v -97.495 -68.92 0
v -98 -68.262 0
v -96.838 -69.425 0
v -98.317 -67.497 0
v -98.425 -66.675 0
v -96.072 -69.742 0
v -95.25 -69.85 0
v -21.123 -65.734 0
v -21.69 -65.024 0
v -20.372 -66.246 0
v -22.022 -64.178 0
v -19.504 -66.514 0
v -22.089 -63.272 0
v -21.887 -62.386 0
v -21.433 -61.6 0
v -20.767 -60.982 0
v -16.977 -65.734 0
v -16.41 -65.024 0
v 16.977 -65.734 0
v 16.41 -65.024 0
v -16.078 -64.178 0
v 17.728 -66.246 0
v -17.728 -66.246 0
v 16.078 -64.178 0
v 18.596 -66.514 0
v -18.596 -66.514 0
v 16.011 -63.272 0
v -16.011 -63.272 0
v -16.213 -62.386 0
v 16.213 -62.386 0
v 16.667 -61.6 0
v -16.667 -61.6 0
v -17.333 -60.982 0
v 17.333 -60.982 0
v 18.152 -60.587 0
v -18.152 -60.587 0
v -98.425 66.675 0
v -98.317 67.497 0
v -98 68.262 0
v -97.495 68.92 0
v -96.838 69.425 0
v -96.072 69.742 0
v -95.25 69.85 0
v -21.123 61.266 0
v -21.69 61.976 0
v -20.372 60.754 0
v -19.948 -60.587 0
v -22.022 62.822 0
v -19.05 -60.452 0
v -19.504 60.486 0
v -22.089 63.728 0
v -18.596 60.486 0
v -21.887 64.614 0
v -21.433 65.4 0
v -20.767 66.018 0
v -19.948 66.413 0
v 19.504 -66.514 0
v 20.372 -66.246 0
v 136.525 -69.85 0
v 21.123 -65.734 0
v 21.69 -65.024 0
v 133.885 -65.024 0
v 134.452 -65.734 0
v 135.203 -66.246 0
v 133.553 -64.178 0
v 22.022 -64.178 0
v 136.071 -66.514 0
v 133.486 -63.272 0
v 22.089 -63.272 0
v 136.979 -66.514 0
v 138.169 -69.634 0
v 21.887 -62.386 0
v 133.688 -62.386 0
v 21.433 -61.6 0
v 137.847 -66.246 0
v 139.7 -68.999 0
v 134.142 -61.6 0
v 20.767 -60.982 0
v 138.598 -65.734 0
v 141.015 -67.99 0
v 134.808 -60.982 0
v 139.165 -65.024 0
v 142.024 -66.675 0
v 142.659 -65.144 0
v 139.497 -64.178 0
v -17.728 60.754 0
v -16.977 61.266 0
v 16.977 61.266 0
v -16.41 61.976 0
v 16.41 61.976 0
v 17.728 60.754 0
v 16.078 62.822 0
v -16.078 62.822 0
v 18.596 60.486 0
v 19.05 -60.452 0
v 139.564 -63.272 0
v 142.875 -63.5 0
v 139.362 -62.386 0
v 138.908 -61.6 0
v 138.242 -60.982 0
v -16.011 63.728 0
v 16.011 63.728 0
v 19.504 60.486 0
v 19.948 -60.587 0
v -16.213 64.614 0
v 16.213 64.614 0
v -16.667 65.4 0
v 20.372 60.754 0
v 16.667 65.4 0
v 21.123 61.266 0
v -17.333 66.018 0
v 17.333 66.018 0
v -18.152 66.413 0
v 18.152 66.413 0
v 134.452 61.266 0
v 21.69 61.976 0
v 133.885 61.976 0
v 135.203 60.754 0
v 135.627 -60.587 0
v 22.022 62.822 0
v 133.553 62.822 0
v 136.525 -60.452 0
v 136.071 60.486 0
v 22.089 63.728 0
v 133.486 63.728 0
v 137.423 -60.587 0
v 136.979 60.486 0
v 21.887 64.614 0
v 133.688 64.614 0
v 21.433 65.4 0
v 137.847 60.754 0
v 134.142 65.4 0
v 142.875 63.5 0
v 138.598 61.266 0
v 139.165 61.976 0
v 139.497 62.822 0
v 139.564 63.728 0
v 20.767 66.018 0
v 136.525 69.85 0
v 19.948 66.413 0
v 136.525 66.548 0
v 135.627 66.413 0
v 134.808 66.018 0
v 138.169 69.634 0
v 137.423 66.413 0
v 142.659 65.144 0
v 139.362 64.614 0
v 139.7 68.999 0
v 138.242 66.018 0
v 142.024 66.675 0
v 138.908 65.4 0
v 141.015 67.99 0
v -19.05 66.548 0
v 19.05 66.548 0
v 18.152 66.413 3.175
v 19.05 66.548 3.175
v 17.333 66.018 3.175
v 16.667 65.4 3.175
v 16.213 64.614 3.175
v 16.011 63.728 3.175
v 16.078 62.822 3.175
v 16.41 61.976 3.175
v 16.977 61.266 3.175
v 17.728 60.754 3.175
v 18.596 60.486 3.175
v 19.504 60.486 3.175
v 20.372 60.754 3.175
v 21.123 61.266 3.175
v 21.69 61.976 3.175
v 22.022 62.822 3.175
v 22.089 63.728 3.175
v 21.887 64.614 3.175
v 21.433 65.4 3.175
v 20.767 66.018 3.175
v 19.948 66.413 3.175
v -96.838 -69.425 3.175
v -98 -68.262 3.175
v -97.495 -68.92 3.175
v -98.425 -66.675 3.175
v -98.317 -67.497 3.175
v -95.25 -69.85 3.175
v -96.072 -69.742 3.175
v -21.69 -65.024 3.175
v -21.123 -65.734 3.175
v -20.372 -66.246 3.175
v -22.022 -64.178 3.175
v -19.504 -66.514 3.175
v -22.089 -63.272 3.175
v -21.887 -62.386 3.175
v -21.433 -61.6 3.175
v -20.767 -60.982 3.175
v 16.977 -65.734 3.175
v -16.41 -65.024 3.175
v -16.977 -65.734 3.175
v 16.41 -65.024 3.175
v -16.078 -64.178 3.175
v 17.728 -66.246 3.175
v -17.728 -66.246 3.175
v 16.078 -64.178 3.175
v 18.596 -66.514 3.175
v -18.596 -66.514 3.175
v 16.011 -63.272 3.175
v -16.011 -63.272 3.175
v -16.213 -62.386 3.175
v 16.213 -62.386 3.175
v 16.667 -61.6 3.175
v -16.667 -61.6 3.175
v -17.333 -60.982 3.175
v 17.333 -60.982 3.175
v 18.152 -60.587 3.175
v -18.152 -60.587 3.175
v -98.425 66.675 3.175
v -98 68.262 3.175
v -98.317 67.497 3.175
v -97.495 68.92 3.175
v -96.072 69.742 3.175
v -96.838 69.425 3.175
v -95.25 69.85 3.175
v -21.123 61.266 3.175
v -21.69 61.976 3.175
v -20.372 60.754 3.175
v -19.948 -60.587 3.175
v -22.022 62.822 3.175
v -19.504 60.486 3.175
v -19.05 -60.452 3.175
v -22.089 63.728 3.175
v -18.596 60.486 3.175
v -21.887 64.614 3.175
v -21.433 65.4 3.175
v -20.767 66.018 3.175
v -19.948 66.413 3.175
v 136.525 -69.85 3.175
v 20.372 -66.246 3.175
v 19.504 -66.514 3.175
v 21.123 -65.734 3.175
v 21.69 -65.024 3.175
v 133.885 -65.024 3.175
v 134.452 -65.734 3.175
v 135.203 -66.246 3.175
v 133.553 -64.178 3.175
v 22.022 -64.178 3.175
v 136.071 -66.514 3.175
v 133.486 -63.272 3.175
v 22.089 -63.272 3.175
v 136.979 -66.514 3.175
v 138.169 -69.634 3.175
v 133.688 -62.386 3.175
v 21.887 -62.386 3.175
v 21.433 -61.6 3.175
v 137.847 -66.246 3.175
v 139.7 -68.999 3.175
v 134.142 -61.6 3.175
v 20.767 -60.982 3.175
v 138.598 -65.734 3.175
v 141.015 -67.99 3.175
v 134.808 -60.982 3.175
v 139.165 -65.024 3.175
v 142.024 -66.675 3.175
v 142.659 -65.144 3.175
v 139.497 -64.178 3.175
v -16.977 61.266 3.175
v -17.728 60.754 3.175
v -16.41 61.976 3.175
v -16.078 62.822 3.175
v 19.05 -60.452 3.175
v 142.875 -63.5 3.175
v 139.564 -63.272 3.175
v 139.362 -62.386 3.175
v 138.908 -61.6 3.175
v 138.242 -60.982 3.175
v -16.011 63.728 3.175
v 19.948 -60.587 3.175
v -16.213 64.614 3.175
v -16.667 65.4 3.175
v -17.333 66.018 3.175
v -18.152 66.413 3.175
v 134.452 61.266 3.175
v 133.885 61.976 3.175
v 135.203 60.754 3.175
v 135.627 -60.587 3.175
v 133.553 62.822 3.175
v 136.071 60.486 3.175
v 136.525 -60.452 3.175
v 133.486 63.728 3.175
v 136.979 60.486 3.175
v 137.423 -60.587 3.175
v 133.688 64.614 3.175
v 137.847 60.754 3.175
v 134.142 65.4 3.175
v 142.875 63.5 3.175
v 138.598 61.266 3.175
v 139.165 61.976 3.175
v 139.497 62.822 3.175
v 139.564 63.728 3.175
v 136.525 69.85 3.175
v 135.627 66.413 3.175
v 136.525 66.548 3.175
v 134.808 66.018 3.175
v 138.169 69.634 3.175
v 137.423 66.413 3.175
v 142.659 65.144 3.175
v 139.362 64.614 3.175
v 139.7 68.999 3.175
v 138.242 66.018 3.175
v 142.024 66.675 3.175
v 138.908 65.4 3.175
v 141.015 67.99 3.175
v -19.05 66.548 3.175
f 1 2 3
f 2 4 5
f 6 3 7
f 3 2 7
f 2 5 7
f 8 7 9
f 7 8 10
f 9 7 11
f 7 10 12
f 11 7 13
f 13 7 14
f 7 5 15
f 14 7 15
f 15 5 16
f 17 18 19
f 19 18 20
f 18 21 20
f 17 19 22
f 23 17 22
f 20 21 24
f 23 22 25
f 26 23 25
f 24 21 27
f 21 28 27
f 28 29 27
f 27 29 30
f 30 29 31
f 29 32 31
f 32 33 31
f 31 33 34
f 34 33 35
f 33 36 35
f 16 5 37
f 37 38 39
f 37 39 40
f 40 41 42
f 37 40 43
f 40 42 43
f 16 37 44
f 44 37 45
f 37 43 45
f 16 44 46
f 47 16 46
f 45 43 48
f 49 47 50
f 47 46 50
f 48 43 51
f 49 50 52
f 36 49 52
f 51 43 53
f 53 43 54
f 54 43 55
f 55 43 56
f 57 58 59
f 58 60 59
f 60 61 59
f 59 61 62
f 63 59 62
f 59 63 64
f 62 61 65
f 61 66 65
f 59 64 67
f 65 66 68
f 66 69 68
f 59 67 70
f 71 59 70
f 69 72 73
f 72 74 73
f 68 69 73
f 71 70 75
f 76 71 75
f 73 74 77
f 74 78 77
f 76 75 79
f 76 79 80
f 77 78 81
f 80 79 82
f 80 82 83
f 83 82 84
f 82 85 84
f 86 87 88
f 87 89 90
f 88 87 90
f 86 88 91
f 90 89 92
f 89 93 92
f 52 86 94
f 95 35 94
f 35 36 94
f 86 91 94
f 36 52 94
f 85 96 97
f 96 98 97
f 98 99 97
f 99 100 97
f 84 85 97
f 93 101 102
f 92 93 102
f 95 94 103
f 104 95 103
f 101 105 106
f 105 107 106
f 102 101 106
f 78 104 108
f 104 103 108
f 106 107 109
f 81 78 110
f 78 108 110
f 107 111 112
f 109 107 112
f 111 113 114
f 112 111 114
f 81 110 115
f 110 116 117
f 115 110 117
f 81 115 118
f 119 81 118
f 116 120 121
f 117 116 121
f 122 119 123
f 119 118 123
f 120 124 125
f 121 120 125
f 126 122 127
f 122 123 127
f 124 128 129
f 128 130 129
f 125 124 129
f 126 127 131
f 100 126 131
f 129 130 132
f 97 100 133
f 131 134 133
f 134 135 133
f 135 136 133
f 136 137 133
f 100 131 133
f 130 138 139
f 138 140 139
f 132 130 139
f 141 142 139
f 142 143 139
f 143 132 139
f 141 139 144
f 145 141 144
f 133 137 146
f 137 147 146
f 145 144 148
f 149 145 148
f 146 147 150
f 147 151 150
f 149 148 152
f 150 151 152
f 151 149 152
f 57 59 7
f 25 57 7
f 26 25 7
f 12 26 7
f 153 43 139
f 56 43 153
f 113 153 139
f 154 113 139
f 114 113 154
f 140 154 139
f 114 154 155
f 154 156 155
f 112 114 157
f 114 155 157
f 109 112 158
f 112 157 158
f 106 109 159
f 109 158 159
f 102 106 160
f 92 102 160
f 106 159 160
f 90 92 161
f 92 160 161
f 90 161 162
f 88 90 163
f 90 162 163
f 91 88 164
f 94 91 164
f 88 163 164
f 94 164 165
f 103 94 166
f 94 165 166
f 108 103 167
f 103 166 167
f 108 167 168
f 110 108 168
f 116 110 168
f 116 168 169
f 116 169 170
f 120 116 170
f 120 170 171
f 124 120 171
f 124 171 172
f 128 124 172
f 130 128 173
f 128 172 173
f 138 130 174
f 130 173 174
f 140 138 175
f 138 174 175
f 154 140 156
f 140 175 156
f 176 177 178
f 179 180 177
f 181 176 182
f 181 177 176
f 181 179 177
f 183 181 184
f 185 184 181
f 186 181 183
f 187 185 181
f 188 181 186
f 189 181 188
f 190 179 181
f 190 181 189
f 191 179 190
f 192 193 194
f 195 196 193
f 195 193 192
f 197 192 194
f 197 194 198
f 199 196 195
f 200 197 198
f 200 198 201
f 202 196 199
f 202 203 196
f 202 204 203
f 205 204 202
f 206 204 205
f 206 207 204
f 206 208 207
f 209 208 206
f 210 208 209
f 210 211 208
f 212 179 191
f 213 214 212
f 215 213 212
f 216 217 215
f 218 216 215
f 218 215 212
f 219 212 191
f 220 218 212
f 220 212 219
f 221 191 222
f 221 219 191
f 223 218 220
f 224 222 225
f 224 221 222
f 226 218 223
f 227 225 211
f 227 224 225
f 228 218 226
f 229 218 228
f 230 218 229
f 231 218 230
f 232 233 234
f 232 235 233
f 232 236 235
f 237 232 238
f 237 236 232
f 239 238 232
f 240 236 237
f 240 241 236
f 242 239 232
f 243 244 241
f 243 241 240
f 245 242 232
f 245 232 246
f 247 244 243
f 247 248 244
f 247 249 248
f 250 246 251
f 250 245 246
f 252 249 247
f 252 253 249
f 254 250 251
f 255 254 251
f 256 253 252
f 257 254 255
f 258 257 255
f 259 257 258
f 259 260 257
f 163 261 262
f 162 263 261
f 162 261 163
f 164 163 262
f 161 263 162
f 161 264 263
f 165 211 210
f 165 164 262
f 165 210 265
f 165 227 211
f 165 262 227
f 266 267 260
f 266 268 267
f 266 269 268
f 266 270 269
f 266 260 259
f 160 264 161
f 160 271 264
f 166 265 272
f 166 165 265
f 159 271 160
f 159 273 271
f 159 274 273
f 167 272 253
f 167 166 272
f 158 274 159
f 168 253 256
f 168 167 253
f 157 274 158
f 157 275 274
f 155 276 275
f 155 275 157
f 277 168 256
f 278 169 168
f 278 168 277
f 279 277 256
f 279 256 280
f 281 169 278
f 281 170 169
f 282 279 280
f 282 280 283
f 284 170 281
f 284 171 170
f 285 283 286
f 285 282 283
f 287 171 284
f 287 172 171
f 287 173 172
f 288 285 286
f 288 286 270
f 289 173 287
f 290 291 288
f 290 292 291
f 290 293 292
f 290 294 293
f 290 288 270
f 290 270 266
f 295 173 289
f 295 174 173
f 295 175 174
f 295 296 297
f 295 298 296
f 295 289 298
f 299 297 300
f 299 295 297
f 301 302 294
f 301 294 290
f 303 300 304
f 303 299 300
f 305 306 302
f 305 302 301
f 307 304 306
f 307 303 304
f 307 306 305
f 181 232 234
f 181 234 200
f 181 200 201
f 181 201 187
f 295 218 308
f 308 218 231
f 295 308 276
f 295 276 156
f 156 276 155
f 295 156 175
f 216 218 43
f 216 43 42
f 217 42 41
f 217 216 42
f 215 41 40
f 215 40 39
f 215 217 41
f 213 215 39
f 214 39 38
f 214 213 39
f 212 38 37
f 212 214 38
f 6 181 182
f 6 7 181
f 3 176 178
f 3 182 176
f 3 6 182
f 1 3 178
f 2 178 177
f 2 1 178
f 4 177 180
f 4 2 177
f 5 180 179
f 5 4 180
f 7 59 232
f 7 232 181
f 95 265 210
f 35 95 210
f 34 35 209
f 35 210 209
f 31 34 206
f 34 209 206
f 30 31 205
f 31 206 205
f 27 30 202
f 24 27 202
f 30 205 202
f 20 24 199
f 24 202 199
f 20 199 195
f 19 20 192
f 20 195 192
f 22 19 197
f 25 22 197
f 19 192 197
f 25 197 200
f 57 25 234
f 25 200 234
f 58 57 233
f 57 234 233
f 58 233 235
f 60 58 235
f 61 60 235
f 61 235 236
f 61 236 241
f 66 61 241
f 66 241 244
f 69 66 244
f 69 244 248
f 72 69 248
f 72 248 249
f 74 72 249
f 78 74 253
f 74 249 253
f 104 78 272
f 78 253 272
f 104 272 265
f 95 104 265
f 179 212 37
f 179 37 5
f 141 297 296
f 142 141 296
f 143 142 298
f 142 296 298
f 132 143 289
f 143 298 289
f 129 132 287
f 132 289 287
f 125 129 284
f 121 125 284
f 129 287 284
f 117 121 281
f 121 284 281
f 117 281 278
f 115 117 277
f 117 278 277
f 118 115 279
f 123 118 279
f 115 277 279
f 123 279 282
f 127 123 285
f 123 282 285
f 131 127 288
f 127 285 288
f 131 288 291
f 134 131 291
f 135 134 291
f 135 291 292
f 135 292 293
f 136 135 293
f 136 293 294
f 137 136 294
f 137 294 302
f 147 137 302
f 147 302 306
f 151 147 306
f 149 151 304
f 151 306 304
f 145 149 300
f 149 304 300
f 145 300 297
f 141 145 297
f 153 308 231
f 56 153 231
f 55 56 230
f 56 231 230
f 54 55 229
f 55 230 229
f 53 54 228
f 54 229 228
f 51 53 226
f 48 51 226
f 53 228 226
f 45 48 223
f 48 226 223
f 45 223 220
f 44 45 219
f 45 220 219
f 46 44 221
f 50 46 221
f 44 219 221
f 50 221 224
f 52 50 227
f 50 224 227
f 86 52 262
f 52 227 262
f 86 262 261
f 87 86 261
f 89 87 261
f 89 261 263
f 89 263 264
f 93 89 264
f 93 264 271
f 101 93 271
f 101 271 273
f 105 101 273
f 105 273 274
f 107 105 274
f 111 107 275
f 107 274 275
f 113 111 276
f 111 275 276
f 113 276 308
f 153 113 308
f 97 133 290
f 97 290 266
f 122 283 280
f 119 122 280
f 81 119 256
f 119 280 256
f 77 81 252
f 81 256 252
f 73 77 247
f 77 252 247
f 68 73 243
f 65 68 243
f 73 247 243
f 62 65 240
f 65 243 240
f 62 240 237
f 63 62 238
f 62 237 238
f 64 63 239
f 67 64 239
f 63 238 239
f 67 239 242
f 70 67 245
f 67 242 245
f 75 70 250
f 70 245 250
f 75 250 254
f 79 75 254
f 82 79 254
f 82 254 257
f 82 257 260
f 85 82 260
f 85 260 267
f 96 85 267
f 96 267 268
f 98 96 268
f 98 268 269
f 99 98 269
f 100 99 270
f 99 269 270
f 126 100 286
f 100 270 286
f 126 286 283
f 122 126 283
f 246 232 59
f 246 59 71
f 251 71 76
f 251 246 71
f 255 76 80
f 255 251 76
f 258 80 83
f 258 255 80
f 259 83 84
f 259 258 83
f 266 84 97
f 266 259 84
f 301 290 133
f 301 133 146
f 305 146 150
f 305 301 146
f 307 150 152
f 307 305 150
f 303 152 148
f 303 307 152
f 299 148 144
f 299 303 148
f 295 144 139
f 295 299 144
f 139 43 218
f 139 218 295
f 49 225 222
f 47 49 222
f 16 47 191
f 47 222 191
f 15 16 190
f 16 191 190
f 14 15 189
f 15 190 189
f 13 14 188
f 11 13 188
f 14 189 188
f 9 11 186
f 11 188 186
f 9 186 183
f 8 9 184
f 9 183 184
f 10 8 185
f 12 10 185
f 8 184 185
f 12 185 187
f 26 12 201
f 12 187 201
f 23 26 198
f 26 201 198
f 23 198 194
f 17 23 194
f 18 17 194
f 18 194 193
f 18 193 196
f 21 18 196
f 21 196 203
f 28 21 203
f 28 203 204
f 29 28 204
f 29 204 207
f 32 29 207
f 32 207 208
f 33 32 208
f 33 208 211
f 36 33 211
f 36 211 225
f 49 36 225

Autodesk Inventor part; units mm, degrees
ref_plane "YZ Plane" through (0, 0, 0) normal (1, 0, 0) x (0, 1, 0)
ref_plane "XZ Plane" through (0, 0, 0) normal (0, 1, 0) x (-1, 0, 0)
ref_plane "XY Plane" through (0, 0, 0) normal (0, 0, 1) x (1, 0, 0)
sketch "Sketch1" plane through (0, 0, 0) normal (0, 0, 1) x (1, 0, 0)
  line L0 (0, 97.79) -> (0, -97.79) projected
  line L1 (-200.025, 0) -> (200.025, 0) projected
  line L2 (142.875, -69.85) -> (-142.875, -69.85)
  line L3 (-142.875, -69.85) -> (-142.875, 69.85)
  line L4 (-142.875, 69.85) -> (142.875, 69.85)
  line L5 (142.875, 69.85) -> (142.875, -69.85)
  line L6 (142.875, -69.85) -> (-142.875, 69.85) construction
  line L7 (-142.875, -69.85) -> (142.875, 69.85) construction
  line L8 (-136.525, -63.5) -> (136.525, -63.5) construction
  line L9 (136.525, -63.5) -> (136.525, 63.5) construction
  line L10 (136.525, 63.5) -> (-136.525, 63.5) construction
  line L11 (-136.525, 63.5) -> (-136.525, -63.5) construction
  line L12 (-136.525, -63.5) -> (136.525, 63.5) construction
  line L13 (136.525, -63.5) -> (-136.525, 63.5) construction
  line L14 (-100.965, -14.2875) -> (-114.935, -14.2875)
  line L15 (-114.935, -14.2875) -> (-114.935, 14.2875)
  line L16 (-114.935, 14.2875) -> (-100.965, 14.2875)
  line L17 (-100.965, 14.2875) -> (-100.965, -14.2875)
  line L18 (-100.965, -14.2875) -> (-114.935, 14.2875) construction
  line L19 (-114.935, -14.2875) -> (-100.965, 14.2875) construction
  circle A0 centre (44.45, 31.75) radius 10.795
  circle A1 centre (44.45, -31.75) radius 10.795
  circle A2 centre (95.25, 0) radius 11.303
  circle A3 centre (95.25, 0) radius 30 construction
  line L20 (-64.135, -14.2875) -> (-50.165, -14.2875)
  line L21 (-50.165, -14.2875) -> (-50.165, 14.2875)
  line L22 (-50.165, 14.2875) -> (-64.135, 14.2875)
  line L23 (-64.135, 14.2875) -> (-64.135, -14.2875)
  line L24 (-64.135, -14.2875) -> (-50.165, 14.2875) construction
  line L25 (-50.165, -14.2875) -> (-64.135, 14.2875) construction
  line L26 (7.9375, -6.985) -> (-20.6375, -6.985)
  line L27 (-20.6375, -6.985) -> (-20.6375, 6.985)
  line L28 (-20.6375, 6.985) -> (7.9375, 6.985)
  line L29 (7.9375, 6.985) -> (7.9375, -6.985)
  line L30 (7.9375, -6.985) -> (-20.6375, 6.985) construction
  line L31 (-20.6375, -6.985) -> (7.9375, 6.985) construction
  point P0 (0, 0)
  point P1 (-107.95, 0)
  point P2 (95.25, 14.732)
  point P3 (95.25, -14.732)
  point P4 (-19.05, 63.5)
  point P5 (-19.05, -63.5)
  point P6 (19.05, -63.5)
  point P7 (19.05, 63.5)
  point P8 (-57.15, 0)
  point P9 (-6.35, 0)
  dimension "d0" = 285.75
  dimension "d1" = 139.7
  dimension "d4" = 6.35
  dimension "d5" = 6.35
  dimension "d6" = 13.97
  dimension "d7" = 28.575
  dimension "d15" = 0
  dimension "d16" = 21.59
  dimension "d20" = 22.606
  dimension "d22" = 60
  dimension "d33" = 47.625
  dimension "d34" = 14.732
  dimension "d35" = 14.732
  dimension "d43" = 34.925
  dimension "d44" = 31.75
  dimension "d45" = 31.75
  dimension "d46" = 152.4
  dimension "d47" = 50.8
  dimension "d48" = 19.05
  dimension "d49" = 19.05
  dimension "d50" = 50.8
  dimension "d51" = 50.8
extrude "Extrusion1" add sketch "Sketch1" along normal blind 3.175 contours L4 L5 L1 A2 L29 L28 L0 | L0 L28 L27 L1 L21 L22 L23 L17 L16 L15 L3 L4 | L28 L29 L1 L0 | L0 L1 L27 L28 | L1 L29 L26 L0 | L0 L26 L27 L1 | L1 L15 L14 L17 L23 L20 L21 L27 L26 L0 L2 L3 | L5 L2 L0 L26 L29 L1 A2 | L15 L16 L17 L1 | L1 L17 L14 L15 | A2 L1 | L1 A2 | L21 L20 L23 L1 | L1 L23 L22 L21 | A0 | A1
hole "Hole1" at (-136.525, 63.5, 0) at (-136.525, -63.5, 0) at (136.525, 63.5, 0) at (136.525, -63.5, 0) at (19.05, -63.5, 0) at (-19.05, 63.5, 0) at (19.05, 63.5, 0) at (-19.05, -63.5, 0) direction (0, 0, 1) diameter 6.096 end through all
fillet "Fillet1" radius 6.35 4 edges at (142.875, -69.85, 1.5875) (142.875, 69.85, 1.5875) (-142.875, -69.85, 1.5875) (-142.875, 69.85, 1.5875)
hole "Hole2" [suppressed]
sketch "Sketch2" plane through (0, 0, 3.175) normal (0, 0, 1) x (1, 0, 0)
  line L0 (0, 97.79) -> (0, -97.79) projected
  line L1 (-200.025, 0) -> (200.025, 0) projected
  line L2 (-98.425, -76.2) -> (-142.875, -76.2)
  line L3 (-142.875, -76.2) -> (-142.875, 76.2)
  line L4 (-142.875, 76.2) -> (-98.425, 76.2)
  line L5 (-98.425, 76.2) -> (-98.425, -76.2)
  line L6 (-98.425, -76.2) -> (-142.875, 76.2) construction
  line L7 (-142.875, -76.2) -> (-98.425, 76.2) construction
  line L8 (-142.875, 63.5) -> (-142.875, -63.5) projected
  point P0 (0, 0)
  point P1 (-120.65, 0)
  dimension "d52" = 0
  dimension "d53" = 44.45
  dimension "d54" = 152.4
extrude "Extrusion2" cut sketch "Sketch2" against normal blind 25.4
fillet "Fillet2" radius 3.175 2 edges at (-98.425, 69.85, 1.5875) (-98.425, -69.85, 1.5875)
equation "\"d35\" = d34"
